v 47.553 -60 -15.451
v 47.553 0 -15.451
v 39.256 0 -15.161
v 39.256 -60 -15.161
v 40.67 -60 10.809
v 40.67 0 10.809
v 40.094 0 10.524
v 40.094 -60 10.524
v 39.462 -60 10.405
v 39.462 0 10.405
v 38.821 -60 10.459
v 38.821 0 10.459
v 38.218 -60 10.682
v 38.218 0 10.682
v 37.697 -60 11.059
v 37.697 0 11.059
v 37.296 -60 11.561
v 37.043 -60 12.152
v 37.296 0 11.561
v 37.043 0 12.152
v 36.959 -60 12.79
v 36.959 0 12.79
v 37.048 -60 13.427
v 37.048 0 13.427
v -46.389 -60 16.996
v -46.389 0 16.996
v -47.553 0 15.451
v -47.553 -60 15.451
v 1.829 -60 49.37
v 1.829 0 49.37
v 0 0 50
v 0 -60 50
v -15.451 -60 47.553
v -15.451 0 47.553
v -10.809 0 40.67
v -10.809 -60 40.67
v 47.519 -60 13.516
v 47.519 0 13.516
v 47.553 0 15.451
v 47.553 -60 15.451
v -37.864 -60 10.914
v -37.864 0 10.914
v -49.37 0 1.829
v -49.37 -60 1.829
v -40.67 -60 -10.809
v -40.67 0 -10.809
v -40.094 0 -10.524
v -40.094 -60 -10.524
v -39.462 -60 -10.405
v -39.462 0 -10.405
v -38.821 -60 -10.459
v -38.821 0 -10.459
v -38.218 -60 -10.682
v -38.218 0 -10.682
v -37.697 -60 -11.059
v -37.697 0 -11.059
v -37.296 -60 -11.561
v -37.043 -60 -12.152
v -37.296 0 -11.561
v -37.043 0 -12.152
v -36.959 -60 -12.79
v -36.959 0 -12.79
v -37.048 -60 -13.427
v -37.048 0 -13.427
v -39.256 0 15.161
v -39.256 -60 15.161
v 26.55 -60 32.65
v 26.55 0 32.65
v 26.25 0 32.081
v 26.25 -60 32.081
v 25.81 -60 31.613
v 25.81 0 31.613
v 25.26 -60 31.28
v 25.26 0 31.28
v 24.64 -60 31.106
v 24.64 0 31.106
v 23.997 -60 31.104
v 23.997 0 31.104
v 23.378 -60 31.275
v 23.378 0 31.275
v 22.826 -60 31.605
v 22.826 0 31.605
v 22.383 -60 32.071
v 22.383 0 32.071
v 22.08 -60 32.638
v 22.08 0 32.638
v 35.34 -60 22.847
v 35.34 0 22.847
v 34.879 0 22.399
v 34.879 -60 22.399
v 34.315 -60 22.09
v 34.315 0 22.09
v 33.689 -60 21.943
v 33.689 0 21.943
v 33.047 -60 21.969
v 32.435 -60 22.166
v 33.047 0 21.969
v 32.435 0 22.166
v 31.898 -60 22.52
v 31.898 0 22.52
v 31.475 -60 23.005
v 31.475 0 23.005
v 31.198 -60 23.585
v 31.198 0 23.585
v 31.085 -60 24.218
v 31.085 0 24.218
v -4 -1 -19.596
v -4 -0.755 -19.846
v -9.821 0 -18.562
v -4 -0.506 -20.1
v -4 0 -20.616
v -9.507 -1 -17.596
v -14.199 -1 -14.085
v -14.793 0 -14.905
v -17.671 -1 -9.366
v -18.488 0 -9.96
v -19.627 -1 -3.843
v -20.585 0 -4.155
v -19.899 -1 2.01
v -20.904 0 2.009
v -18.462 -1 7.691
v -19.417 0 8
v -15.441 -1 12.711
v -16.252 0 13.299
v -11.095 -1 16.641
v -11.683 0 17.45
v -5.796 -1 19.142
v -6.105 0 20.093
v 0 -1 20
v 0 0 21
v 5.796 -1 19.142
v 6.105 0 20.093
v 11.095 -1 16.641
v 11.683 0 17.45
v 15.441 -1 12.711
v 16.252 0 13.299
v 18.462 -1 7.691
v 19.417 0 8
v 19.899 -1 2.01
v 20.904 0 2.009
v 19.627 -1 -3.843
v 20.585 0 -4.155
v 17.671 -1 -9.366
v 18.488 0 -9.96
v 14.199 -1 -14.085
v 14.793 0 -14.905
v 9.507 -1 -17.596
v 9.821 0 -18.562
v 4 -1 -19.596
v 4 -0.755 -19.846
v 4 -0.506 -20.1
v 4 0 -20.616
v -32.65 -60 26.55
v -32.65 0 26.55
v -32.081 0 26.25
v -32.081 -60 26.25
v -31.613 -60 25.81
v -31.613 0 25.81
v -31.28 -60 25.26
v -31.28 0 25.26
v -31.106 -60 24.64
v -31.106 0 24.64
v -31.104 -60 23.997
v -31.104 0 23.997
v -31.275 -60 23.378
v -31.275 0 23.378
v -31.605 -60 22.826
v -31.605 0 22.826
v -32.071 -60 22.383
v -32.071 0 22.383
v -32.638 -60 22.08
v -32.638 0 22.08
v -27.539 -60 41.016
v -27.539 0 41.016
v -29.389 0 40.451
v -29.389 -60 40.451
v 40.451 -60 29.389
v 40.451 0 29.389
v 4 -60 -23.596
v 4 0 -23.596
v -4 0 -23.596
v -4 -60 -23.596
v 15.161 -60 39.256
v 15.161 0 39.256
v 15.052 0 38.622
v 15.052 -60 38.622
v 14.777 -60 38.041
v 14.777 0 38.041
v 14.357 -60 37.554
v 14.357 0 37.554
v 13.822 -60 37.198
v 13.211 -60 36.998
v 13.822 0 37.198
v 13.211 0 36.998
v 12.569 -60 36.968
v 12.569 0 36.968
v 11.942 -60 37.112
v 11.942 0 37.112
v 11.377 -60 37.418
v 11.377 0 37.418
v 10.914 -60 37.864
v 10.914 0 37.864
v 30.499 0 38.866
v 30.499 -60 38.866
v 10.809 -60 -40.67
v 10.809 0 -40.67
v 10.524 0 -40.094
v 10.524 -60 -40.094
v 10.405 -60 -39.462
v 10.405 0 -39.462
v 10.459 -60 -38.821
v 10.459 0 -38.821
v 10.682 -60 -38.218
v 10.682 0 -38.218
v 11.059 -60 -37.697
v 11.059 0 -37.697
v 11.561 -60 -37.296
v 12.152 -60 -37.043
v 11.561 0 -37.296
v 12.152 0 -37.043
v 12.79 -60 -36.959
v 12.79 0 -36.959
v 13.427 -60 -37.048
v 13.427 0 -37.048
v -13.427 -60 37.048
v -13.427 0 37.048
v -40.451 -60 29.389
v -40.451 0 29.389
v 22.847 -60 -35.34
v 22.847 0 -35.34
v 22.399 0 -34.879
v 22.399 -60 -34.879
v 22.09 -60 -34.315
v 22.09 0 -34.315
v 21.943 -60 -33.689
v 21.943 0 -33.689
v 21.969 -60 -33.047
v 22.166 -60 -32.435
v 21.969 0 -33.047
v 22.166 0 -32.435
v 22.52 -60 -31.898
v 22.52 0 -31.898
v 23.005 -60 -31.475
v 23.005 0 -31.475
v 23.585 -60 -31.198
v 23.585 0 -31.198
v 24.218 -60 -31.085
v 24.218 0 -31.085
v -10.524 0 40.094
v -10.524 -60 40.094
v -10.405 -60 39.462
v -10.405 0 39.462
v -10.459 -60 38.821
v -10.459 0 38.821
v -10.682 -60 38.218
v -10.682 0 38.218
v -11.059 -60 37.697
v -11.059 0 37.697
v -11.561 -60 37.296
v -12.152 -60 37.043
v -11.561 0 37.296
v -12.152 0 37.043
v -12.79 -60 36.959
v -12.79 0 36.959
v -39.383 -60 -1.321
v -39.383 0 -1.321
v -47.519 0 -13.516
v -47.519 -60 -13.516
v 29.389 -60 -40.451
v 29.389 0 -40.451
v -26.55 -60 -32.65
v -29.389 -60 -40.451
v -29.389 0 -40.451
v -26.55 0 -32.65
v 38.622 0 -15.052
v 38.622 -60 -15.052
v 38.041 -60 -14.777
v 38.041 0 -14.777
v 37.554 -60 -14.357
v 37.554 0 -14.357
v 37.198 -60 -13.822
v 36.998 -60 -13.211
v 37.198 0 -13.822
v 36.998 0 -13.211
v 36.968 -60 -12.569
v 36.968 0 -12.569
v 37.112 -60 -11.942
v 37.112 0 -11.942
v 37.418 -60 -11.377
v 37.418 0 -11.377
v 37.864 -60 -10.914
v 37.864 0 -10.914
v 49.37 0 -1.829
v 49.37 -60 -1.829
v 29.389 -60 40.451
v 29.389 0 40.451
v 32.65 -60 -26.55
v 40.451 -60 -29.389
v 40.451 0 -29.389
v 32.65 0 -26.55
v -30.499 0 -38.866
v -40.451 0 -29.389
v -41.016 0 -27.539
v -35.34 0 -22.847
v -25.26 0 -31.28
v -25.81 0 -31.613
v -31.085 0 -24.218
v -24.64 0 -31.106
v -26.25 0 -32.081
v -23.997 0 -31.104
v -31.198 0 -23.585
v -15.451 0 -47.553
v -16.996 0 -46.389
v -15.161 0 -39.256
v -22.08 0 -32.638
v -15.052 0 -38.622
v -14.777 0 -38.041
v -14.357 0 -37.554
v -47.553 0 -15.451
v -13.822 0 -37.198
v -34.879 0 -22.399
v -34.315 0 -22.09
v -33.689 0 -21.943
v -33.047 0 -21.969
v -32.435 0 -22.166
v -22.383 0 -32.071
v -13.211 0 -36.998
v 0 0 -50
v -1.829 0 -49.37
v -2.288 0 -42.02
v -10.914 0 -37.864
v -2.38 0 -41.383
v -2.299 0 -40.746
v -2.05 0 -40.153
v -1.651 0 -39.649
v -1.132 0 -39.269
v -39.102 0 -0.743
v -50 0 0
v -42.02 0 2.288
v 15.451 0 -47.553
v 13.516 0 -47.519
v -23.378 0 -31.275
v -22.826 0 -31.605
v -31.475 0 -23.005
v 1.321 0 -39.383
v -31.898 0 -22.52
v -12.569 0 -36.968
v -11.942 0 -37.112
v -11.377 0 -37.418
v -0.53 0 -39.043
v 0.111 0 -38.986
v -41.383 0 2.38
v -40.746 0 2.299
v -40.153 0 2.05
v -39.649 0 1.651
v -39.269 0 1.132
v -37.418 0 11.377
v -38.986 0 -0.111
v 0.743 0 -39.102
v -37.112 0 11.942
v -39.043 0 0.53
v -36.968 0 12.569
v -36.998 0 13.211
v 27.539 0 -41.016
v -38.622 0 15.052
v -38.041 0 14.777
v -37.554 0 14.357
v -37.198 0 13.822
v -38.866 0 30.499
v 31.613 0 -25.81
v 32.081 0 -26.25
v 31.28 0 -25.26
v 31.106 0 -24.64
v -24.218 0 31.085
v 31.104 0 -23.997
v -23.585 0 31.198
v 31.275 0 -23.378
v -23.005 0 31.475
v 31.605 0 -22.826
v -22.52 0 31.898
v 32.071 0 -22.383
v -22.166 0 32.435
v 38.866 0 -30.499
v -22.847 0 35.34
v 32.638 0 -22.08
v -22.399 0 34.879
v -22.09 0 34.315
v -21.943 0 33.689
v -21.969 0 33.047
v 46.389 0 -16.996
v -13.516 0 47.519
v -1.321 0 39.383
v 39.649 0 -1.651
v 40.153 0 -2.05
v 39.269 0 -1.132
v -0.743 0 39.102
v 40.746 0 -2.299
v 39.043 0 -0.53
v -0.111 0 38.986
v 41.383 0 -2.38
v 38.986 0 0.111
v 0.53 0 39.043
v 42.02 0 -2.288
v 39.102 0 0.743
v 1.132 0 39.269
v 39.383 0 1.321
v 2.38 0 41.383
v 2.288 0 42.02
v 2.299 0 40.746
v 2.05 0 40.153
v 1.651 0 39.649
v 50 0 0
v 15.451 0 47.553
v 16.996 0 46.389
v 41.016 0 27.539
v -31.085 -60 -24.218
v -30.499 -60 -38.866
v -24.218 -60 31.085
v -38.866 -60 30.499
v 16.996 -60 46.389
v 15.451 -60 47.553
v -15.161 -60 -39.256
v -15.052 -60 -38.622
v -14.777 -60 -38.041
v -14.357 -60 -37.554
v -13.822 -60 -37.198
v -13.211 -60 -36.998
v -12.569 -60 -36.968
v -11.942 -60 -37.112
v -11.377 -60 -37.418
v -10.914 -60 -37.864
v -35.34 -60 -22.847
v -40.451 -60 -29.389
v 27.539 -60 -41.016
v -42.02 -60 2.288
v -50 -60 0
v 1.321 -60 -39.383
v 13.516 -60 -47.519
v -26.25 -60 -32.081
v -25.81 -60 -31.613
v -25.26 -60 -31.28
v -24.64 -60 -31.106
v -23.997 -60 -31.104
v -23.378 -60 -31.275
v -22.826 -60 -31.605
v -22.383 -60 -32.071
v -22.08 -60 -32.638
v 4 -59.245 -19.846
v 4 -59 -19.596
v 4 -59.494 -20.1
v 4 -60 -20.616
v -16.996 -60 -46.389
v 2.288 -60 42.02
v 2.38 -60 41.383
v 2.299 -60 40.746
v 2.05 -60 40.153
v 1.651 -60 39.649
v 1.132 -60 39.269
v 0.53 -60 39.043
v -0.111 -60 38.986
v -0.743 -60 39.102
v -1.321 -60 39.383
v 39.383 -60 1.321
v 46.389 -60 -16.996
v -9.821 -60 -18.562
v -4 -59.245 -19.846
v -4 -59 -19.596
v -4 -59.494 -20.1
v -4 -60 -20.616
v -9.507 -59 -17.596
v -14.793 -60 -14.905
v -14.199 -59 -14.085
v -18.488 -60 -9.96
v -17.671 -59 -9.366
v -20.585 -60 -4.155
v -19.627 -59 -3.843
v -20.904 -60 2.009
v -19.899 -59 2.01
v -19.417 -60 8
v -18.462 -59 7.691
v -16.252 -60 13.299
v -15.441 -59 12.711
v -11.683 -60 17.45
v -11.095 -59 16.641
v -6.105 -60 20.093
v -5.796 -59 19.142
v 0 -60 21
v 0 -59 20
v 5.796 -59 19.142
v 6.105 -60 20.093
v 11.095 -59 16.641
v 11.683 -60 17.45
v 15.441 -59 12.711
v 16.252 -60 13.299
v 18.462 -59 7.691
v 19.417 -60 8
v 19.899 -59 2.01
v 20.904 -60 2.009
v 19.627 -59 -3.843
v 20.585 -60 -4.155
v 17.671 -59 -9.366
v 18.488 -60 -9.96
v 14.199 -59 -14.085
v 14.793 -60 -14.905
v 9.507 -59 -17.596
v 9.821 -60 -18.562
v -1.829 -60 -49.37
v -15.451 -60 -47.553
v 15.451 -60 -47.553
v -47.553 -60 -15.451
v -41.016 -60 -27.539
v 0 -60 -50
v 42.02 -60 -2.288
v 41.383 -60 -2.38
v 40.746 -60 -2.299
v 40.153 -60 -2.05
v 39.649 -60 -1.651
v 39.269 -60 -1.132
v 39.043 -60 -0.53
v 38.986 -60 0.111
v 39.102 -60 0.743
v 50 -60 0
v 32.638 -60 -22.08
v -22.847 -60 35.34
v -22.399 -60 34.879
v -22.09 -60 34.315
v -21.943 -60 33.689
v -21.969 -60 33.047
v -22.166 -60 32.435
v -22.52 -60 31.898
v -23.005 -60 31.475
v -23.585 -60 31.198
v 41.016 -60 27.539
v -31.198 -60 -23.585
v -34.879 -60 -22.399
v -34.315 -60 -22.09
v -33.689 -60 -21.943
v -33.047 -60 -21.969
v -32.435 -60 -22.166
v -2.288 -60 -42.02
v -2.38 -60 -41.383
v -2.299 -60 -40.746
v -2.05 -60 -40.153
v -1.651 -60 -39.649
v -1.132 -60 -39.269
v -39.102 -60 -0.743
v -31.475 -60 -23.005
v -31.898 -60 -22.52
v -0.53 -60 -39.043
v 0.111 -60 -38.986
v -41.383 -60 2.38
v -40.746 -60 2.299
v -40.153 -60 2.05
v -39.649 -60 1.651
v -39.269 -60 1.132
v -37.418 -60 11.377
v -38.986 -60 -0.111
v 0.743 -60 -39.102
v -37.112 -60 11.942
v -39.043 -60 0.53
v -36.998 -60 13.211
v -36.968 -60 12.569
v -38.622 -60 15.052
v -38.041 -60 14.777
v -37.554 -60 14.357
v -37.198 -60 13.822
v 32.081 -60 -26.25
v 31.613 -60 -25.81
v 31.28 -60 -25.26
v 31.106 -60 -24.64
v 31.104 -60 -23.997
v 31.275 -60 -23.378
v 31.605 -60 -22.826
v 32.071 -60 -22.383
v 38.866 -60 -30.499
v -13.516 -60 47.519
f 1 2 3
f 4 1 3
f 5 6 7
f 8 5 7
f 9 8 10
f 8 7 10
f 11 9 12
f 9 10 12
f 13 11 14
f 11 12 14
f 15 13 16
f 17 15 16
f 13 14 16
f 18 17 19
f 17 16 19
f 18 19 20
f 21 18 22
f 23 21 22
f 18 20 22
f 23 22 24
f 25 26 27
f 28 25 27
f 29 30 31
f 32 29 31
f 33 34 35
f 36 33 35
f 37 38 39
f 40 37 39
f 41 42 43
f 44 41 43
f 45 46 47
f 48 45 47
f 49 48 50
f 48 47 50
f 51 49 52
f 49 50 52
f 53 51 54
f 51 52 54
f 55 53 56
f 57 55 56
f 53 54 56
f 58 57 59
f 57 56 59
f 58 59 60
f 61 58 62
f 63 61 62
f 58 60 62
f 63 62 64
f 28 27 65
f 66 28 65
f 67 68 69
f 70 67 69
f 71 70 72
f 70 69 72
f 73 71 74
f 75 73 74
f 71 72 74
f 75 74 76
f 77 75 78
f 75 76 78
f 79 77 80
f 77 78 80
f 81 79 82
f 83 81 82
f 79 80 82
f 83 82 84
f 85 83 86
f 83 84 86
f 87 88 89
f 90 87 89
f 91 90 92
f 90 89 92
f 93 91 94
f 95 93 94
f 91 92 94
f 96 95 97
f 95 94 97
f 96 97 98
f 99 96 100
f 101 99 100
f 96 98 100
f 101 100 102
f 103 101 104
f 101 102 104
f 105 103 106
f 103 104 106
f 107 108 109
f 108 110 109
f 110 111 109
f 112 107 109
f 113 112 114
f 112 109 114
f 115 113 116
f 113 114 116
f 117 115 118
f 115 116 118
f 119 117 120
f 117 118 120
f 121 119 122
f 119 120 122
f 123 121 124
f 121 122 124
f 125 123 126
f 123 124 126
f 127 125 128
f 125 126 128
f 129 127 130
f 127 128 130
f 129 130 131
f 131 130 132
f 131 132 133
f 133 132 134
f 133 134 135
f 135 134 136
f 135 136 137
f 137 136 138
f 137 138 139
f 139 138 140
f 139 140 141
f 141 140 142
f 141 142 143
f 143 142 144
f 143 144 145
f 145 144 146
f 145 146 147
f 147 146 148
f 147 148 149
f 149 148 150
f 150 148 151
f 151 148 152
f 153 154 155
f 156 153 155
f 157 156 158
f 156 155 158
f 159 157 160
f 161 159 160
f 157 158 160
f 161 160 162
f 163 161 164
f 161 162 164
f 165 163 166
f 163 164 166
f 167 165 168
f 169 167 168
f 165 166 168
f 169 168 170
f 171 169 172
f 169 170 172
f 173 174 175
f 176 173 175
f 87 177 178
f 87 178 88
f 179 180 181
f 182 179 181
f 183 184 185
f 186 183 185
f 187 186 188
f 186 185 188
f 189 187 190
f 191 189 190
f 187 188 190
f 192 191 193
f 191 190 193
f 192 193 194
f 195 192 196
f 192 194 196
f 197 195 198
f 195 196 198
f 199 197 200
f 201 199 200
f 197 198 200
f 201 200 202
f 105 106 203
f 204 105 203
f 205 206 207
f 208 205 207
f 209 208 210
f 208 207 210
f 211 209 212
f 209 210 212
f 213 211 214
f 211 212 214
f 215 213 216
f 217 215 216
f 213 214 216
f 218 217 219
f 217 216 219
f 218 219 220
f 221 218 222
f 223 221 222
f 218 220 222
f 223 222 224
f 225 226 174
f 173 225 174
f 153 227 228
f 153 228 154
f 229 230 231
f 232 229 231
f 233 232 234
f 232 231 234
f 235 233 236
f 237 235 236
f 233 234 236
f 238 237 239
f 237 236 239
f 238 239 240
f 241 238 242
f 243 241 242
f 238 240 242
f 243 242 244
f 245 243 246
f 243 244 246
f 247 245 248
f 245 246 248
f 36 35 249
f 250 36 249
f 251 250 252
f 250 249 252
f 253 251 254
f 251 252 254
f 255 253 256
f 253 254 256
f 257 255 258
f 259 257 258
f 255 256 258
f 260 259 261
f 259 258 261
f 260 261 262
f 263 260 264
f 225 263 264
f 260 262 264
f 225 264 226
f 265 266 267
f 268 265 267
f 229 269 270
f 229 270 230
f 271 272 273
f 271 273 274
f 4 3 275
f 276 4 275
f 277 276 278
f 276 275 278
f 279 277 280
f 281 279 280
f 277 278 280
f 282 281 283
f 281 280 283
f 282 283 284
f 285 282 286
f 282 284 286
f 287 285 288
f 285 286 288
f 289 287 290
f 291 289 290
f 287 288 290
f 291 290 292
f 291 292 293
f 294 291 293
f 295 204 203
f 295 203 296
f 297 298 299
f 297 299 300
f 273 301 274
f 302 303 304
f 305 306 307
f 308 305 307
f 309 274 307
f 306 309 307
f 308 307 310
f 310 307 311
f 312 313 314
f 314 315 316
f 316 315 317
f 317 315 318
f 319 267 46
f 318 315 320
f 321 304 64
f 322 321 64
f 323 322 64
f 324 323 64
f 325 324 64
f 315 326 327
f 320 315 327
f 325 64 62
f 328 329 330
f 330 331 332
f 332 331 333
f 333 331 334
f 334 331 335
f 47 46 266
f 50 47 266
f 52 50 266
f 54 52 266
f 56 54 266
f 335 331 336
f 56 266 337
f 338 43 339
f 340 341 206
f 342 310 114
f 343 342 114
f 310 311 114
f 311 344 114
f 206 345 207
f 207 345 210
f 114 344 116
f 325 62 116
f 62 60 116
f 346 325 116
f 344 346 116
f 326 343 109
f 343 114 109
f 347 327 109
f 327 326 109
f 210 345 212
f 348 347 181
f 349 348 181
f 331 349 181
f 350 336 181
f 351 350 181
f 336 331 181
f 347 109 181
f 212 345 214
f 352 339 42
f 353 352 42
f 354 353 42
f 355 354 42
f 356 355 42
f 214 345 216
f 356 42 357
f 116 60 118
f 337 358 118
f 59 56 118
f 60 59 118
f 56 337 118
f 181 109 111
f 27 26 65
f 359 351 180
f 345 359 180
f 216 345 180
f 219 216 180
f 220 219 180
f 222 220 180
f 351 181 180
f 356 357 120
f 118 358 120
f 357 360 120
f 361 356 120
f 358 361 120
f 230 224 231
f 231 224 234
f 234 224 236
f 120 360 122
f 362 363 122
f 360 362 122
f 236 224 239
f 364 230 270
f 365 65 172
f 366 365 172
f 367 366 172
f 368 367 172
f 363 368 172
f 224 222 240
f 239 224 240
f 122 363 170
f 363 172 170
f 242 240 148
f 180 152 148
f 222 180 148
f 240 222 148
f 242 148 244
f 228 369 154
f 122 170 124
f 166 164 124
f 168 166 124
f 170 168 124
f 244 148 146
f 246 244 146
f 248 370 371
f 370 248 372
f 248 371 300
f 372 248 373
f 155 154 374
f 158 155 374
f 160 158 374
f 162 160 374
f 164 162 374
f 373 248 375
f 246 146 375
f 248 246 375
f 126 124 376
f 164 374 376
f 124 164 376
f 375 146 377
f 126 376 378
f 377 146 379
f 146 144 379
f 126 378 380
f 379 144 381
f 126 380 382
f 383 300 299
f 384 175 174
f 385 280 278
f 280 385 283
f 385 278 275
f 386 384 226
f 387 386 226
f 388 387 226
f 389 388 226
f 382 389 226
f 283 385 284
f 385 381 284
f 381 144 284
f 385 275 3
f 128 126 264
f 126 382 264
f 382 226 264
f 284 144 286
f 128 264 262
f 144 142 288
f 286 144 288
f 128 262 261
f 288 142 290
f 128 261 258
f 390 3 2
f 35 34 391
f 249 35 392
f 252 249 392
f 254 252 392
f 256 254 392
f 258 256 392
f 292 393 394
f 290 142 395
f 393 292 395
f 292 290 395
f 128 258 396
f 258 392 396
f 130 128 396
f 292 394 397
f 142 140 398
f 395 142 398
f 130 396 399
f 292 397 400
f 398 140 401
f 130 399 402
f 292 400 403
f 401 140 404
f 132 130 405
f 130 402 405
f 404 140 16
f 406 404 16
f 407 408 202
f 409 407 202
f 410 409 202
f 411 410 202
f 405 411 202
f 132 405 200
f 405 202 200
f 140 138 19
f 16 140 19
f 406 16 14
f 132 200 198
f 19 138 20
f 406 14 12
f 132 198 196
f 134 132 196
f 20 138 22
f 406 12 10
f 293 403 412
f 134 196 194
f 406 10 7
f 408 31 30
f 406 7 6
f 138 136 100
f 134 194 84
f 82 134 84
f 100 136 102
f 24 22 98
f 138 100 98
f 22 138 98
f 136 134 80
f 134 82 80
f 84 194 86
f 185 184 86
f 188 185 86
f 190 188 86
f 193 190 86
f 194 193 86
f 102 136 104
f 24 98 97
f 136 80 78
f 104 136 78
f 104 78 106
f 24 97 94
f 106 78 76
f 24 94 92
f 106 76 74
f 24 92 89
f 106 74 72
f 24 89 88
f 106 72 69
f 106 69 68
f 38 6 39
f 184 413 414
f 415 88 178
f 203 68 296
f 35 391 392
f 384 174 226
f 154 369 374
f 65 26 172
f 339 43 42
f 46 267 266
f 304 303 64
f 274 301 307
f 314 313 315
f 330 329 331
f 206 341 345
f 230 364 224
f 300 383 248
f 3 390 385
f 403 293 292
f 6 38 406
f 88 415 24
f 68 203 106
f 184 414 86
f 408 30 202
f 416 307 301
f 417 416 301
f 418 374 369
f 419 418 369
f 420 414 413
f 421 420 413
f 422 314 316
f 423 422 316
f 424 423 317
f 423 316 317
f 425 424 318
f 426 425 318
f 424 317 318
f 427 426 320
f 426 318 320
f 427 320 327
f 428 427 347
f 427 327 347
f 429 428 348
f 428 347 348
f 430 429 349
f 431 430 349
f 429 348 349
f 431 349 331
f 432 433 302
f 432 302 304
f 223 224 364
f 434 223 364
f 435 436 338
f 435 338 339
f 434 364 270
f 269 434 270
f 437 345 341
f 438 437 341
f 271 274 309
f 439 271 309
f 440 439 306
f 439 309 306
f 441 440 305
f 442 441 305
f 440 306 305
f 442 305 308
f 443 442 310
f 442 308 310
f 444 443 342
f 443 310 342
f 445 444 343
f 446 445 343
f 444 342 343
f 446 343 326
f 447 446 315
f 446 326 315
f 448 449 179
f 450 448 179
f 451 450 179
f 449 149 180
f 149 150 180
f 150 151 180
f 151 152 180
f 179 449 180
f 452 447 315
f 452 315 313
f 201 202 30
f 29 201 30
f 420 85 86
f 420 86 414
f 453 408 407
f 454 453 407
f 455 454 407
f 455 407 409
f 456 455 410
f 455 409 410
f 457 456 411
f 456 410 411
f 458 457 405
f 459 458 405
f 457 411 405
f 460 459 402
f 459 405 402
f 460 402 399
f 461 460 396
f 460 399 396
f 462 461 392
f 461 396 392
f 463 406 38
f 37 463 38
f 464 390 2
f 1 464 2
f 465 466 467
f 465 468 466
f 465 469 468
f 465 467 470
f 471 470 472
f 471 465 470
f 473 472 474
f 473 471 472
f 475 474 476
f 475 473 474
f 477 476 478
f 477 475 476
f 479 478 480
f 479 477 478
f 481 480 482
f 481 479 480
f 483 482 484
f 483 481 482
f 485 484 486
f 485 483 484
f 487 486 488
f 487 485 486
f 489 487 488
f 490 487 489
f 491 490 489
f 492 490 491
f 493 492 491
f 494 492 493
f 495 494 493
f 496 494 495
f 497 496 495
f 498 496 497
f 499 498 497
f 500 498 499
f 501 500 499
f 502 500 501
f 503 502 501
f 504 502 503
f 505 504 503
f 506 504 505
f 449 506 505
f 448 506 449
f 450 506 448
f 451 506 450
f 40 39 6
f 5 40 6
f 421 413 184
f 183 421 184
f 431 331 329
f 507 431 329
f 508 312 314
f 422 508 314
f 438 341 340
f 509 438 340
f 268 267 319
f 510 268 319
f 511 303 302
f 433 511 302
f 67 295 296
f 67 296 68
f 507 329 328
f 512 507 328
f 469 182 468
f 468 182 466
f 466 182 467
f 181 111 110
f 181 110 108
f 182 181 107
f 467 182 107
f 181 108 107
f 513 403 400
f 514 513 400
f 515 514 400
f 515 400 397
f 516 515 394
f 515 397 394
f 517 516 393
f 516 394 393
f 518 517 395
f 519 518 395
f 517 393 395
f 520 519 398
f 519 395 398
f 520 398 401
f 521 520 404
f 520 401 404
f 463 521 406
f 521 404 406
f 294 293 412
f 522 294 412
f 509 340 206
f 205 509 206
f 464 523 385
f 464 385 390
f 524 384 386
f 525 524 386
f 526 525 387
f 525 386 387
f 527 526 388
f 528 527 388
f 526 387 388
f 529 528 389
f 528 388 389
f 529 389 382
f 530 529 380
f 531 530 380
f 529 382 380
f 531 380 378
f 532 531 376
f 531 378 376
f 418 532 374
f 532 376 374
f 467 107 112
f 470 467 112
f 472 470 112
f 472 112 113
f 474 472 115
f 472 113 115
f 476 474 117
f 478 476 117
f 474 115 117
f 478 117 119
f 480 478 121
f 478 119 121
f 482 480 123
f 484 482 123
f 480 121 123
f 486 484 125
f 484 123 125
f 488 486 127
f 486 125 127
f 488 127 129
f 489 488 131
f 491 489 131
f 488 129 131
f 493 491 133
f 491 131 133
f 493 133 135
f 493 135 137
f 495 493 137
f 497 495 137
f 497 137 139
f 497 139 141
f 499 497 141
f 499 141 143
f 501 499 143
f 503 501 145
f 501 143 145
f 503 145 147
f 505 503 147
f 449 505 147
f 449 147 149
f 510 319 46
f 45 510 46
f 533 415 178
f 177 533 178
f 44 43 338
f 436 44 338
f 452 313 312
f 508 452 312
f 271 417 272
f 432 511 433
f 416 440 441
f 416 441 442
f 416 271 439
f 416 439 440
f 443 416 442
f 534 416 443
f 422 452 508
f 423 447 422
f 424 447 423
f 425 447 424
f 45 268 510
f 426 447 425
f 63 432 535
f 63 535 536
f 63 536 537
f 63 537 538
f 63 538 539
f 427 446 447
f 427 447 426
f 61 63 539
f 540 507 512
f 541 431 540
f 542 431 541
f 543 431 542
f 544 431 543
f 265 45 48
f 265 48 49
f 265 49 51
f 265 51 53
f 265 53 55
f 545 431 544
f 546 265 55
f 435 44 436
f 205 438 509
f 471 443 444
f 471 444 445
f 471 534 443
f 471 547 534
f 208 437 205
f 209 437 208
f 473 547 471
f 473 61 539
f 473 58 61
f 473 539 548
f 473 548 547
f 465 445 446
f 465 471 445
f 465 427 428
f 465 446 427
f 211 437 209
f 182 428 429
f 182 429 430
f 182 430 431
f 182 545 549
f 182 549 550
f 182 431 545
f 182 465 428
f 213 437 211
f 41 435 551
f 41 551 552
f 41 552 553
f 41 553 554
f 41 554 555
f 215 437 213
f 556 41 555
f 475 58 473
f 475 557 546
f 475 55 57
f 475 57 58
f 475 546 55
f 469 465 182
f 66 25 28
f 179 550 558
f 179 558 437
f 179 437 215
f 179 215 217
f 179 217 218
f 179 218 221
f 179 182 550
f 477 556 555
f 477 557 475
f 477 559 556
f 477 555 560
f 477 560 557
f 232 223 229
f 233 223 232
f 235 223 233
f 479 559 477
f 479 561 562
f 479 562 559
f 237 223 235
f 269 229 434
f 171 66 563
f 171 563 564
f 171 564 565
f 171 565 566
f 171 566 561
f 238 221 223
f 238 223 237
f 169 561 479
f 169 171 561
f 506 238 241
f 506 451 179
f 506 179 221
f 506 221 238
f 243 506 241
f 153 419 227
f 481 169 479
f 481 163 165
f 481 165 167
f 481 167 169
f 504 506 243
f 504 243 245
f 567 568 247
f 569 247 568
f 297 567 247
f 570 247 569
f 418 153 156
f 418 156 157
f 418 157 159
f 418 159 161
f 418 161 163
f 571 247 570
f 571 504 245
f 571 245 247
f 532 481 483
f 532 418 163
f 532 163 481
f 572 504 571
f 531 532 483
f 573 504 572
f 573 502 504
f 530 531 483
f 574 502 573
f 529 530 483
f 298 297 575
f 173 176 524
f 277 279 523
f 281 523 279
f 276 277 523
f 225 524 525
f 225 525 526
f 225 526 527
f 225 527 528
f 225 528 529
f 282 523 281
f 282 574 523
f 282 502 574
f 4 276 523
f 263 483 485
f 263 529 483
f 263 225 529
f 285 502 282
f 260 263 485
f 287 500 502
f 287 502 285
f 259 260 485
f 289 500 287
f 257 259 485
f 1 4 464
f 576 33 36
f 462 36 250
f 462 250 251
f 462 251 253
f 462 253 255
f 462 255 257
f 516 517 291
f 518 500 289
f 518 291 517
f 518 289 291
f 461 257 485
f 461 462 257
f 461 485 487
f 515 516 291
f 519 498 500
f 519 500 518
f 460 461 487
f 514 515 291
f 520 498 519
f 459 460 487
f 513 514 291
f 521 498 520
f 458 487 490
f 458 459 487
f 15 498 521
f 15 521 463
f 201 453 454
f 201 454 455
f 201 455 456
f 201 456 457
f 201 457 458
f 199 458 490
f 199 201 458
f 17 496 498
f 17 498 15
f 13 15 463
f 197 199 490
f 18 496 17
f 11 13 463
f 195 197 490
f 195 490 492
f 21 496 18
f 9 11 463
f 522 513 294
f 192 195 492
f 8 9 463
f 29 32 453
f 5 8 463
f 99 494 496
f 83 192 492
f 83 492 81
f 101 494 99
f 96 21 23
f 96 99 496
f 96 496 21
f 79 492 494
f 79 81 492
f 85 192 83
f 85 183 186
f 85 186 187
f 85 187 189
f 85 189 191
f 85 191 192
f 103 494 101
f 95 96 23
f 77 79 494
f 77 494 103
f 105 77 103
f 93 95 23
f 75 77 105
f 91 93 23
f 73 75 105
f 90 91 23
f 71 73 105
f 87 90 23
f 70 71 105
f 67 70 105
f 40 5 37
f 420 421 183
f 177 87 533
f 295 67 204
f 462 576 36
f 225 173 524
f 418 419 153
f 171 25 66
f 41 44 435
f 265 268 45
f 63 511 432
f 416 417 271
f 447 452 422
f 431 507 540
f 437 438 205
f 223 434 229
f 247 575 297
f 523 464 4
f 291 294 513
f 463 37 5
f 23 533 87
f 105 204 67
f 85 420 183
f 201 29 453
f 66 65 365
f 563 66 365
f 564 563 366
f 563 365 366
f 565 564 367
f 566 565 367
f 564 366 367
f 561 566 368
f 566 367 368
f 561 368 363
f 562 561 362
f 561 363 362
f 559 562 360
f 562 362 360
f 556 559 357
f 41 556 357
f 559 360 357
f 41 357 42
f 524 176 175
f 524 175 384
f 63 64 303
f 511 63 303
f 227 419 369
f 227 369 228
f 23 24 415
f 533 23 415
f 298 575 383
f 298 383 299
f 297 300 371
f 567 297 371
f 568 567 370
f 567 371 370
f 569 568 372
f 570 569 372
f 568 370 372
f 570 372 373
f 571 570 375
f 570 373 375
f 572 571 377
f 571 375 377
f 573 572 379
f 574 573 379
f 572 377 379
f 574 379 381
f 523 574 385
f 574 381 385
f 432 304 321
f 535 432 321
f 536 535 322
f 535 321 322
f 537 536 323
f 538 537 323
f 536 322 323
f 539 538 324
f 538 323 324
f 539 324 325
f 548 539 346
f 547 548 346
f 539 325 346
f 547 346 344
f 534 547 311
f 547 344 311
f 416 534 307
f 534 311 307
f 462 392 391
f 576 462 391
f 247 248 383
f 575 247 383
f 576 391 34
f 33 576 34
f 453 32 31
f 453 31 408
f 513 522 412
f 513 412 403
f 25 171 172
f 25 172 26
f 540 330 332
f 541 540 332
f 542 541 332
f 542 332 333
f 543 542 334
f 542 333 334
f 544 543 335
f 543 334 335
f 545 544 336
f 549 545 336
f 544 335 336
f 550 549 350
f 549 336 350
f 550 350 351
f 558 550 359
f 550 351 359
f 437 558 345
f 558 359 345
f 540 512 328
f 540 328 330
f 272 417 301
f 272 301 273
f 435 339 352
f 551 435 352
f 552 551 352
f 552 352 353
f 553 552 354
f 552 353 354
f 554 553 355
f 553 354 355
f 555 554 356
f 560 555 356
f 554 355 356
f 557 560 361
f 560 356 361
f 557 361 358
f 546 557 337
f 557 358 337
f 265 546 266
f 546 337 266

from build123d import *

# Parameters (mm, degrees)
F1_DEPTH = 60
F2_SIZE  = 1


with BuildPart() as f1:
    # F0 (on Front) → F1 (new body)
    with BuildSketch(Plane.XZ):
        with BuildLine():
            Line((1.82927, 49.370132), (0, 50))
            Line((0, 50), (2.288286, 42.019797))
            ThreePointArc((2.288286, 42.019797), (1.404131, 39.441349), (-1.321078, 39.383352))
            Line((-1.321078, 39.383352), (-13.51647, 47.519061))
            Line((-13.51647, 47.519061), (-15.45085, 47.552826))
            Line((-15.45085, 47.552826), (-10.808542, 40.670321))
            ThreePointArc((-10.808542, 40.670321), (-10.852639, 37.944852), (-13.426545, 37.047558))
            Line((-13.426545, 37.047558), (-27.539125, 41.016494))
            Line((-27.539125, 41.016494), (-29.389263, 40.45085))
            Line((-29.389263, 40.45085), (-22.847355, 35.339751))
            ThreePointArc((-22.847355, 35.339751), (-22.047077, 32.734049), (-24.217728, 31.085291))
            Line((-24.217728, 31.085291), (-38.866057, 30.498946))
            Line((-38.866057, 30.498946), (-40.45085, 29.389263))
            Line((-40.45085, 29.389263), (-32.649709, 26.54988))
            ThreePointArc((-32.649709, 26.54988), (-31.083394, 24.319009), (-32.638311, 22.080179))
            Line((-32.638311, 22.080179), (-46.38851, 16.995949))
            Line((-46.38851, 16.995949), (-47.552826, 15.45085))
            Line((-47.552826, 15.45085), (-39.256083, 15.161121))
            ThreePointArc((-39.256083, 15.161121), (-37.077051, 13.523455), (-37.864029, 10.913705))
            Line((-37.864029, 10.913705), (-49.370132, 1.82927))
            Line((-49.370132, 1.82927), (-50, 0))
            Line((-50, 0), (-42.019797, 2.288286))
            ThreePointArc((-42.019797, 2.288286), (-39.441349, 1.404131), (-39.383352, -1.321078))
            Line((-39.383352, -1.321078), (-47.519061, -13.51647))
            Line((-47.519061, -13.51647), (-47.552826, -15.45085))
            Line((-47.552826, -15.45085), (-40.670321, -10.808542))
            ThreePointArc((-40.670321, -10.808542), (-37.944852, -10.852639), (-37.047558, -13.426545))
            Line((-37.047558, -13.426545), (-41.016494, -27.539125))
            Line((-41.016494, -27.539125), (-40.45085, -29.389263))
            Line((-40.45085, -29.389263), (-35.339751, -22.847355))
            ThreePointArc((-35.339751, -22.847355), (-32.734049, -22.047077), (-31.085291, -24.217728))
            Line((-31.085291, -24.217728), (-30.498946, -38.866057))
            Line((-30.498946, -38.866057), (-29.389263, -40.45085))
            Line((-29.389263, -40.45085), (-26.54988, -32.649709))
            ThreePointArc((-26.54988, -32.649709), (-24.319009, -31.083394), (-22.080179, -32.638311))
            Line((-22.080179, -32.638311), (-16.995949, -46.38851))
            Line((-16.995949, -46.38851), (-15.45085, -47.552826))
            Line((-15.45085, -47.552826), (-15.161121, -39.256083))
            ThreePointArc((-15.161121, -39.256083), (-13.523455, -37.077051), (-10.913705, -37.864029))
            Line((-10.913705, -37.864029), (-1.82927, -49.370132))
            Line((-1.82927, -49.370132), (0, -50))
            Line((0, -50), (-2.288286, -42.019797))
            ThreePointArc((-2.288286, -42.019797), (-1.404131, -39.441349), (1.321078, -39.383352))
            Line((1.321078, -39.383352), (13.51647, -47.519061))
            Line((13.51647, -47.519061), (15.45085, -47.552826))
            Line((15.45085, -47.552826), (10.808542, -40.670321))
            ThreePointArc((10.808542, -40.670321), (10.852639, -37.944852), (13.426545, -37.047558))
            Line((13.426545, -37.047558), (27.539125, -41.016494))
            Line((27.539125, -41.016494), (29.389263, -40.45085))
            Line((29.389263, -40.45085), (22.847355, -35.339751))
            ThreePointArc((22.847355, -35.339751), (22.047077, -32.734049), (24.217728, -31.085291))
            Line((24.217728, -31.085291), (38.866057, -30.498946))
            Line((38.866057, -30.498946), (40.45085, -29.389263))
            Line((40.45085, -29.389263), (32.649709, -26.54988))
            ThreePointArc((32.649709, -26.54988), (31.083394, -24.319009), (32.638311, -22.080179))
            Line((32.638311, -22.080179), (46.38851, -16.995949))
            Line((46.38851, -16.995949), (47.552826, -15.45085))
            Line((47.552826, -15.45085), (39.256083, -15.161121))
            ThreePointArc((39.256083, -15.161121), (37.077051, -13.523455), (37.864029, -10.913705))
            Line((37.864029, -10.913705), (49.370132, -1.82927))
            Line((49.370132, -1.82927), (50, 0))
            Line((50, 0), (42.019797, -2.288286))
            ThreePointArc((42.019797, -2.288286), (39.441349, -1.404131), (39.383352, 1.321078))
            Line((39.383352, 1.321078), (47.519061, 13.51647))
            Line((47.519061, 13.51647), (47.552826, 15.45085))
            Line((47.552826, 15.45085), (40.670321, 10.808542))
            ThreePointArc((40.670321, 10.808542), (37.944852, 10.852639), (37.047558, 13.426545))
            Line((37.047558, 13.426545), (41.016494, 27.539125))
            Line((41.016494, 27.539125), (40.45085, 29.389263))
            Line((40.45085, 29.389263), (35.339751, 22.847355))
            ThreePointArc((35.339751, 22.847355), (32.734049, 22.047077), (31.085291, 24.217728))
            Line((31.085291, 24.217728), (30.498946, 38.866057))
            Line((30.498946, 38.866057), (29.389263, 40.45085))
            Line((29.389263, 40.45085), (26.54988, 32.649709))
            ThreePointArc((26.54988, 32.649709), (24.319009, 31.083394), (22.080179, 32.638311))
            Line((22.080179, 32.638311), (16.995949, 46.38851))
            Line((16.995949, 46.38851), (15.45085, 47.552826))
            Line((15.45085, 47.552826), (15.161121, 39.256083))
            ThreePointArc((15.161121, 39.256083), (13.523455, 37.077051), (10.913705, 37.864029))
            Line((10.913705, 37.864029), (1.82927, 49.370132))
        make_face()
        with BuildLine():
            ThreePointArc((-4, -19.595918), (0, 20), (4, -19.595918))
            Line((4, -19.595918), (4, -23.595918))
            Line((4, -23.595918), (-4, -23.595918))
            Line((-4, -23.595918), (-4, -19.595918))
        make_face(mode=Mode.SUBTRACT)
    extrude(amount=F1_DEPTH)

    # F2
    f2_edges = [f1.edges().sort_by_distance(p)[0] for p in [
        (0, -60, 20),
        (0, 0, 20),
    ]]
    chamfer(f2_edges, length=F2_SIZE)


solid = f1.part
